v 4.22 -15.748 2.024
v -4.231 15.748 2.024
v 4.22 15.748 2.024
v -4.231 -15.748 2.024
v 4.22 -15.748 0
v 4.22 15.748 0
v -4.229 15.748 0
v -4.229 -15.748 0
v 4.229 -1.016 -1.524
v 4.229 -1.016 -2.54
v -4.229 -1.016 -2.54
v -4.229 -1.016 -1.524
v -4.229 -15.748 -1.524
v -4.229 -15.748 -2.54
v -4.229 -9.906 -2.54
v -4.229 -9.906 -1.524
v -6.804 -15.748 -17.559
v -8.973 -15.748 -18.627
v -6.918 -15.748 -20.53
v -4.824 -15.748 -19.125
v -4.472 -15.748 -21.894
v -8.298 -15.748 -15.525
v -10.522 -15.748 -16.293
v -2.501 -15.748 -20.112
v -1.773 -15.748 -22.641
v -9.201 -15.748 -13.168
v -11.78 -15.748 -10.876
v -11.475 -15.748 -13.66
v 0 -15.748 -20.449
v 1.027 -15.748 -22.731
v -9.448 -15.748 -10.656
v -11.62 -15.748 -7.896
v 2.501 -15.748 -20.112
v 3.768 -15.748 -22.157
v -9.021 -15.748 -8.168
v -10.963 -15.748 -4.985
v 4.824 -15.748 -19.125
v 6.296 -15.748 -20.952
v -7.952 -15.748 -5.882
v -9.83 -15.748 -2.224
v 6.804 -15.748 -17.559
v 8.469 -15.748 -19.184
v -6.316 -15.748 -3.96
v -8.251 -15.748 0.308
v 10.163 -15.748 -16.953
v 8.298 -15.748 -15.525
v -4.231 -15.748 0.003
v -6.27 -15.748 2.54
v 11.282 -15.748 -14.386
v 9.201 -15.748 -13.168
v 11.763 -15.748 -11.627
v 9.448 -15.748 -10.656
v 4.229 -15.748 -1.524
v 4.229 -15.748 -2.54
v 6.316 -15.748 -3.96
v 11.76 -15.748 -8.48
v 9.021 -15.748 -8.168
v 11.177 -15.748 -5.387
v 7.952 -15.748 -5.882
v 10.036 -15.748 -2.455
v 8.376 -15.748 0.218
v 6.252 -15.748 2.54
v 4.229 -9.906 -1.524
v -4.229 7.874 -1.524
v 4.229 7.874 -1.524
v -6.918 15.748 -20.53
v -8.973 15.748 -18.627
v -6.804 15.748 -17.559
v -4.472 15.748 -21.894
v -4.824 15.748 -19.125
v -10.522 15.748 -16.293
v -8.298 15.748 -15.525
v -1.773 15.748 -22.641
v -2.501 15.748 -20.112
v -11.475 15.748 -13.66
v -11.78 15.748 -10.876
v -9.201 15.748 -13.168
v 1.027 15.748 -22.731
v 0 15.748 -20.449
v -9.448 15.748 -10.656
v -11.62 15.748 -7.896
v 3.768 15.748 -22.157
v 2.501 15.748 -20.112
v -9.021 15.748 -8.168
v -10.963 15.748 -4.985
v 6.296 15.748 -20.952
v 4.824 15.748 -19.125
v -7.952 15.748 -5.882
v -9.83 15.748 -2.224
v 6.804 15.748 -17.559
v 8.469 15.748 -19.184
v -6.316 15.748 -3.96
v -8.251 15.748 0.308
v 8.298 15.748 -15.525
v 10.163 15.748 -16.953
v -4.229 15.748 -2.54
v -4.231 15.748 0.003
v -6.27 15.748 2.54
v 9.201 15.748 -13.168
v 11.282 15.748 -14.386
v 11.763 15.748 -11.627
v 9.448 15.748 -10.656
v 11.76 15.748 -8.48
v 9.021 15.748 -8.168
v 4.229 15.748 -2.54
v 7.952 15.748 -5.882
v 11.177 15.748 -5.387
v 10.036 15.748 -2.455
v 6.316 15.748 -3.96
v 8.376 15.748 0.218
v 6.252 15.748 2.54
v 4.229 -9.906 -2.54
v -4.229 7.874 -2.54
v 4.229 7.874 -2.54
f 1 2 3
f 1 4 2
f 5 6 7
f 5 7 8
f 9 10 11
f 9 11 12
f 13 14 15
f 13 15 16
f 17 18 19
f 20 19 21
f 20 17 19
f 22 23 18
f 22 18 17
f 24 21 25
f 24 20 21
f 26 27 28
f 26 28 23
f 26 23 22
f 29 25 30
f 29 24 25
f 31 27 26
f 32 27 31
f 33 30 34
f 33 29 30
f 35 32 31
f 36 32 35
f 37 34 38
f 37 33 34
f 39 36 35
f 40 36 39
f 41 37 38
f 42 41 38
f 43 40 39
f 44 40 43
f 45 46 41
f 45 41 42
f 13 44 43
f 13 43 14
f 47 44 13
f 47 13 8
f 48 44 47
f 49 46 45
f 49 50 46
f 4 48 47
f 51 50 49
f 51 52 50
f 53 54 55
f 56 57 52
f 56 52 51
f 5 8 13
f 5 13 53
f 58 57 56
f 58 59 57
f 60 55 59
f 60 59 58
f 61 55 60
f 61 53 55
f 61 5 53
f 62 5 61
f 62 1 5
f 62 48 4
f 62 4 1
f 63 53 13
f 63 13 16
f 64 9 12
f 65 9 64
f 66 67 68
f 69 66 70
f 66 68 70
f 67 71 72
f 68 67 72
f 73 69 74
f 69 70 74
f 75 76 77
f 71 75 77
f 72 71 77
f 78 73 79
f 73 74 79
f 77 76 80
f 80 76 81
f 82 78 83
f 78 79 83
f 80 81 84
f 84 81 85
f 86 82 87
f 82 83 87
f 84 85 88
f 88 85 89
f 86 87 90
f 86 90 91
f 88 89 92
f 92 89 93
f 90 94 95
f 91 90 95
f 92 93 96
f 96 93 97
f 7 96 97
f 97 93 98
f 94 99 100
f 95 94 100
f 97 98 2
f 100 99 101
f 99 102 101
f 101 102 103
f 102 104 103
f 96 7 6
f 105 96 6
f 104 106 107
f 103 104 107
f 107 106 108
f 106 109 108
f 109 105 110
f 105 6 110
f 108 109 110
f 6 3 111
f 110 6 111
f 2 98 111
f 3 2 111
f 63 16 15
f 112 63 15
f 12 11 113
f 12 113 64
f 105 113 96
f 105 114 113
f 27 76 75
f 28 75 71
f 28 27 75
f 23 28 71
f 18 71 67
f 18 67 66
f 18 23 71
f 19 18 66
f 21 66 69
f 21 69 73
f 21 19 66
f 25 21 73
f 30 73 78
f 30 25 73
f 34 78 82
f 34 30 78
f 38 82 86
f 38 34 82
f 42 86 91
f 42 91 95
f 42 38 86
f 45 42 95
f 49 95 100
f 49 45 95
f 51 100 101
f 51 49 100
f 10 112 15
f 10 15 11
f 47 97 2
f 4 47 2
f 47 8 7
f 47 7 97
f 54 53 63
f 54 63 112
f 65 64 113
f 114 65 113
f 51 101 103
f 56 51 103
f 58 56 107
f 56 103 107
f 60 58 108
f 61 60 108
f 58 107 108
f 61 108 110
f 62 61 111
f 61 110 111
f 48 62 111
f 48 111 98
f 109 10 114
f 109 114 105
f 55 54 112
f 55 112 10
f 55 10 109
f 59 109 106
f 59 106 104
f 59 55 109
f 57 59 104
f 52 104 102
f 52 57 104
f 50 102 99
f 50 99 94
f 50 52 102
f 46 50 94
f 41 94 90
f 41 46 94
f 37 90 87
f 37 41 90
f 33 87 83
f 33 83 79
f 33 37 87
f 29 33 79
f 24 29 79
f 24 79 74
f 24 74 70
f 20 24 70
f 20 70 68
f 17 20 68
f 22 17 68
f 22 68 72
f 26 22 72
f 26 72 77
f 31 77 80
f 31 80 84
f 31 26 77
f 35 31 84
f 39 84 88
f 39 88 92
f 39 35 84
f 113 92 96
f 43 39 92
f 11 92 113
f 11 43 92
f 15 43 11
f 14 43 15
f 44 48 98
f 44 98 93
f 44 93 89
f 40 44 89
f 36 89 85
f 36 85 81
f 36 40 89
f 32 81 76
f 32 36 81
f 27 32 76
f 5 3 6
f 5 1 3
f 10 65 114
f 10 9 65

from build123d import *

# Parameters (mm, degrees)
F1_DEPTH = 4.2291
F3_DEPTH = 15.748
F5_DEPTH = 15.748
F7_DEPTH = 15.748


with BuildPart() as f1:
    # F0 (on Right) → F1 (new body, symmetric)
    with BuildSketch(Plane.YZ):
        Polygon((15.748, 0), (-15.748, 0), (-15.748, -1.524), (-9.906, -1.524), (-9.906, -2.54), (-1.016, -2.54), (-1.016, -1.524), (7.874, -1.524), (7.874, -2.54), (15.748, -2.54), align=None)
    extrude(amount=F1_DEPTH, both=True)

    # F2 (on Front) → F3 (join, symmetric)
    with BuildSketch(Plane.XZ):
        with BuildLine():
            Line((-4.2291, -2.54), (-4.2291, 0))
            ThreePointArc((-4.2291, 0), (0, -22.775418), (4.2291, 0))
            Line((4.2291, 0), (4.2291, -2.54))
            ThreePointArc((4.2291, -2.54), (0, -20.448815), (-4.2291, -2.54))
        make_face()
    extrude(amount=F3_DEPTH, both=True)

    # F4 (on Front) → F5 (join, symmetric)
    with BuildSketch(Plane.XZ):
        Polygon((4.21976, 0), (6.25176, 0), (6.25176, 2.54), (-6.27044, 2.53999), (-6.263331, 0), (-4.231331, 0), (-4.231331, 2.024057), (4.21976, 2.024057), align=None)
    extrude(amount=F5_DEPTH, both=True)

    # F6 (on Front) → F7 (join, symmetric)
    with BuildSketch(Plane.XZ):
        with BuildLine():
            ThreePointArc((4.2291, 0), (8.459615, -6.247831), (11.558468, -13.127494))
            ThreePointArc((11.558468, -13.127494), (10.93358, -4.606689), (6.25176, 2.54))
            Line((6.25176, 2.54), (4.2291, 0))
        make_face()
        with BuildLine():
            Line((-4.2291, 0), (-6.27044, 2.53999))
            ThreePointArc((-6.27044, 2.53999), (-10.850879, -4.640597), (-11.567703, -13.127494))
            ThreePointArc((-11.567703, -13.127494), (-8.993183, -5.951736), (-4.2291, 0))
        make_face()
    extrude(amount=F7_DEPTH, both=True)


solid = f1.part
